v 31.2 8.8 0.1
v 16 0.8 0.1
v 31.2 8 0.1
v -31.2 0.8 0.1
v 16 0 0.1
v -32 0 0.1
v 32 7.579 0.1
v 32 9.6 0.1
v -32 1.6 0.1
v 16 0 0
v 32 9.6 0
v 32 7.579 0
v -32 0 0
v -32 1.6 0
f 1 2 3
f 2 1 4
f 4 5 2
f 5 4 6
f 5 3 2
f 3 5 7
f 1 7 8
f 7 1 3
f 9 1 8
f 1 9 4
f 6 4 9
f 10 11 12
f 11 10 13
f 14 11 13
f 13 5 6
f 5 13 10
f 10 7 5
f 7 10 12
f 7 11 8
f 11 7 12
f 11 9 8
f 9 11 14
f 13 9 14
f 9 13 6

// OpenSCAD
// file: 820675b.scad
use <../lib.scad>
function ldraw_lib__820675b() = [
// 0 Sticker  1.2 x  8 Triangle Yellow with Transparent Border Left
// 0 Name: 820675b.dat
// 0 Author: Miklos Hosszu [hmick]
// 0 !LDRAW_ORG Part UPDATE 2014-01
// 0 !LICENSE Licensed under CC BY 2.0 and CC BY 4.0 : see CAreadme.txt
// 
// 0 BFC CERTIFY CCW
  [0,"BFC","CERTIFY"],
  [0,"BFC","CCW"],
// 
// 0 !KEYWORDS Dark Shark, Nautica, set 6679
// 
// 0 !HISTORY 2006-08-29 [WilliamH] Swapped colour 16 to colour 0
// 0 !HISTORY 2014-01-25 [MagFors] Unswapped colours
// 0 !HISTORY 2014-06-21 [PTadmin] Official Update 2014-01
// 
// 
// 4 14 -78 -0.25 -2 78 -0.25 -22 78 -0.25 -20 40 -0.25 -2
  [4,14,-78,-0.25,-2,78,-0.25,-22,78,-0.25,-20,40,-0.25,-2],
// 4 16 -78 -0.25 -2 40 -0.25 -2 40 -0.25 0 -80 -0.25 0
  [4,16,-78,-0.25,-2,40,-0.25,-2,40,-0.25,0,-80,-0.25,0],
// 4 16 40 -0.25 0 40 -0.25 -2 78 -0.25 -20 80 -0.25 -18.9474
  [4,16,40,-0.25,0,40,-0.25,-2,78,-0.25,-20,80,-0.25,-18.9474],
// 4 16 80 -0.25 -18.9474 78 -0.25 -20 78 -0.25 -22 80 -0.25 -24
  [4,16,80,-0.25,-18.9474,78,-0.25,-20,78,-0.25,-22,80,-0.25,-24],
// 4 16 80 -0.25 -24 78 -0.25 -22 -78 -0.25 -2 -80 -0.25 -4
  [4,16,80,-0.25,-24,78,-0.25,-22,-78,-0.25,-2,-80,-0.25,-4],
// 3 16 -80 -0.25 -4 -78 -0.25 -2 -80 -0.25 0
  [3,16,-80,-0.25,-4,-78,-0.25,-2,-80,-0.25,0],
// 
// 4 16 -80 0 0 40 0 0 80 0 -18.9474 80 0 -24
  [4,16,-80,0,0,40,0,0,80,0,-18.9474,80,0,-24],
// 3 16 -80 0 0 80 0 -24 -80 0 -4
  [3,16,-80,0,0,80,0,-24,-80,0,-4],
// 
// 4 16 -80 0 0 -80 -0.25 0 40 -0.25 0 40 0 0
  [4,16,-80,0,0,-80,-0.25,0,40,-0.25,0,40,0,0],
// 4 16 40 0 0 40 -0.25 0 80 -0.25 -18.9474 80 0 -18.9474
  [4,16,40,0,0,40,-0.25,0,80,-0.25,-18.9474,80,0,-18.9474],
// 4 16 80 0 -18.9474 80 -0.25 -18.9474 80 -0.25 -24 80 0 -24
  [4,16,80,0,-18.9474,80,-0.25,-18.9474,80,-0.25,-24,80,0,-24],
// 4 16 80 0 -24 80 -0.25 -24 -80 -0.25 -4 -80 0 -4
  [4,16,80,0,-24,80,-0.25,-24,-80,-0.25,-4,-80,0,-4],
// 4 16 -80 0 -4 -80 -0.25 -4 -80 -0.25 0 -80 0 0
  [4,16,-80,0,-4,-80,-0.25,-4,-80,-0.25,0,-80,0,0],
// 
];
makepoly(ldraw_lib__820675b(), line=0.2);
// main file
use <../lib.scad>
use <820675b.scad>
function ldraw_lib__820675c() = [
// 0 Sticker  1.2 x  8 Triangle Yellow with Transparent Border Right
// 0 Name: 820675c.dat
// 0 Author: Miklos Hosszu [hmick]
// 0 !LDRAW_ORG Part UPDATE 2014-01
// 0 !LICENSE Licensed under CC BY 2.0 and CC BY 4.0 : see CAreadme.txt
// 
// 0 BFC CERTIFY CCW
  [0,"BFC","CERTIFY"],
  [0,"BFC","CCW"],
// 
// 0 !KEYWORDS Dark Shark, Nautica, set 6679
// 
// 0 !HISTORY 2014-06-21 [PTadmin] Official Update 2014-01
// 
// 
// 1 16 0 0 0 1 0 0 0 1 0 0 0 -1 820675b.dat
  [1,16,0,0,0,1,0,0,0,1,0,0,0,-1, ldraw_lib__820675b()],
];
makepoly(ldraw_lib__820675c(), line=0.2);
